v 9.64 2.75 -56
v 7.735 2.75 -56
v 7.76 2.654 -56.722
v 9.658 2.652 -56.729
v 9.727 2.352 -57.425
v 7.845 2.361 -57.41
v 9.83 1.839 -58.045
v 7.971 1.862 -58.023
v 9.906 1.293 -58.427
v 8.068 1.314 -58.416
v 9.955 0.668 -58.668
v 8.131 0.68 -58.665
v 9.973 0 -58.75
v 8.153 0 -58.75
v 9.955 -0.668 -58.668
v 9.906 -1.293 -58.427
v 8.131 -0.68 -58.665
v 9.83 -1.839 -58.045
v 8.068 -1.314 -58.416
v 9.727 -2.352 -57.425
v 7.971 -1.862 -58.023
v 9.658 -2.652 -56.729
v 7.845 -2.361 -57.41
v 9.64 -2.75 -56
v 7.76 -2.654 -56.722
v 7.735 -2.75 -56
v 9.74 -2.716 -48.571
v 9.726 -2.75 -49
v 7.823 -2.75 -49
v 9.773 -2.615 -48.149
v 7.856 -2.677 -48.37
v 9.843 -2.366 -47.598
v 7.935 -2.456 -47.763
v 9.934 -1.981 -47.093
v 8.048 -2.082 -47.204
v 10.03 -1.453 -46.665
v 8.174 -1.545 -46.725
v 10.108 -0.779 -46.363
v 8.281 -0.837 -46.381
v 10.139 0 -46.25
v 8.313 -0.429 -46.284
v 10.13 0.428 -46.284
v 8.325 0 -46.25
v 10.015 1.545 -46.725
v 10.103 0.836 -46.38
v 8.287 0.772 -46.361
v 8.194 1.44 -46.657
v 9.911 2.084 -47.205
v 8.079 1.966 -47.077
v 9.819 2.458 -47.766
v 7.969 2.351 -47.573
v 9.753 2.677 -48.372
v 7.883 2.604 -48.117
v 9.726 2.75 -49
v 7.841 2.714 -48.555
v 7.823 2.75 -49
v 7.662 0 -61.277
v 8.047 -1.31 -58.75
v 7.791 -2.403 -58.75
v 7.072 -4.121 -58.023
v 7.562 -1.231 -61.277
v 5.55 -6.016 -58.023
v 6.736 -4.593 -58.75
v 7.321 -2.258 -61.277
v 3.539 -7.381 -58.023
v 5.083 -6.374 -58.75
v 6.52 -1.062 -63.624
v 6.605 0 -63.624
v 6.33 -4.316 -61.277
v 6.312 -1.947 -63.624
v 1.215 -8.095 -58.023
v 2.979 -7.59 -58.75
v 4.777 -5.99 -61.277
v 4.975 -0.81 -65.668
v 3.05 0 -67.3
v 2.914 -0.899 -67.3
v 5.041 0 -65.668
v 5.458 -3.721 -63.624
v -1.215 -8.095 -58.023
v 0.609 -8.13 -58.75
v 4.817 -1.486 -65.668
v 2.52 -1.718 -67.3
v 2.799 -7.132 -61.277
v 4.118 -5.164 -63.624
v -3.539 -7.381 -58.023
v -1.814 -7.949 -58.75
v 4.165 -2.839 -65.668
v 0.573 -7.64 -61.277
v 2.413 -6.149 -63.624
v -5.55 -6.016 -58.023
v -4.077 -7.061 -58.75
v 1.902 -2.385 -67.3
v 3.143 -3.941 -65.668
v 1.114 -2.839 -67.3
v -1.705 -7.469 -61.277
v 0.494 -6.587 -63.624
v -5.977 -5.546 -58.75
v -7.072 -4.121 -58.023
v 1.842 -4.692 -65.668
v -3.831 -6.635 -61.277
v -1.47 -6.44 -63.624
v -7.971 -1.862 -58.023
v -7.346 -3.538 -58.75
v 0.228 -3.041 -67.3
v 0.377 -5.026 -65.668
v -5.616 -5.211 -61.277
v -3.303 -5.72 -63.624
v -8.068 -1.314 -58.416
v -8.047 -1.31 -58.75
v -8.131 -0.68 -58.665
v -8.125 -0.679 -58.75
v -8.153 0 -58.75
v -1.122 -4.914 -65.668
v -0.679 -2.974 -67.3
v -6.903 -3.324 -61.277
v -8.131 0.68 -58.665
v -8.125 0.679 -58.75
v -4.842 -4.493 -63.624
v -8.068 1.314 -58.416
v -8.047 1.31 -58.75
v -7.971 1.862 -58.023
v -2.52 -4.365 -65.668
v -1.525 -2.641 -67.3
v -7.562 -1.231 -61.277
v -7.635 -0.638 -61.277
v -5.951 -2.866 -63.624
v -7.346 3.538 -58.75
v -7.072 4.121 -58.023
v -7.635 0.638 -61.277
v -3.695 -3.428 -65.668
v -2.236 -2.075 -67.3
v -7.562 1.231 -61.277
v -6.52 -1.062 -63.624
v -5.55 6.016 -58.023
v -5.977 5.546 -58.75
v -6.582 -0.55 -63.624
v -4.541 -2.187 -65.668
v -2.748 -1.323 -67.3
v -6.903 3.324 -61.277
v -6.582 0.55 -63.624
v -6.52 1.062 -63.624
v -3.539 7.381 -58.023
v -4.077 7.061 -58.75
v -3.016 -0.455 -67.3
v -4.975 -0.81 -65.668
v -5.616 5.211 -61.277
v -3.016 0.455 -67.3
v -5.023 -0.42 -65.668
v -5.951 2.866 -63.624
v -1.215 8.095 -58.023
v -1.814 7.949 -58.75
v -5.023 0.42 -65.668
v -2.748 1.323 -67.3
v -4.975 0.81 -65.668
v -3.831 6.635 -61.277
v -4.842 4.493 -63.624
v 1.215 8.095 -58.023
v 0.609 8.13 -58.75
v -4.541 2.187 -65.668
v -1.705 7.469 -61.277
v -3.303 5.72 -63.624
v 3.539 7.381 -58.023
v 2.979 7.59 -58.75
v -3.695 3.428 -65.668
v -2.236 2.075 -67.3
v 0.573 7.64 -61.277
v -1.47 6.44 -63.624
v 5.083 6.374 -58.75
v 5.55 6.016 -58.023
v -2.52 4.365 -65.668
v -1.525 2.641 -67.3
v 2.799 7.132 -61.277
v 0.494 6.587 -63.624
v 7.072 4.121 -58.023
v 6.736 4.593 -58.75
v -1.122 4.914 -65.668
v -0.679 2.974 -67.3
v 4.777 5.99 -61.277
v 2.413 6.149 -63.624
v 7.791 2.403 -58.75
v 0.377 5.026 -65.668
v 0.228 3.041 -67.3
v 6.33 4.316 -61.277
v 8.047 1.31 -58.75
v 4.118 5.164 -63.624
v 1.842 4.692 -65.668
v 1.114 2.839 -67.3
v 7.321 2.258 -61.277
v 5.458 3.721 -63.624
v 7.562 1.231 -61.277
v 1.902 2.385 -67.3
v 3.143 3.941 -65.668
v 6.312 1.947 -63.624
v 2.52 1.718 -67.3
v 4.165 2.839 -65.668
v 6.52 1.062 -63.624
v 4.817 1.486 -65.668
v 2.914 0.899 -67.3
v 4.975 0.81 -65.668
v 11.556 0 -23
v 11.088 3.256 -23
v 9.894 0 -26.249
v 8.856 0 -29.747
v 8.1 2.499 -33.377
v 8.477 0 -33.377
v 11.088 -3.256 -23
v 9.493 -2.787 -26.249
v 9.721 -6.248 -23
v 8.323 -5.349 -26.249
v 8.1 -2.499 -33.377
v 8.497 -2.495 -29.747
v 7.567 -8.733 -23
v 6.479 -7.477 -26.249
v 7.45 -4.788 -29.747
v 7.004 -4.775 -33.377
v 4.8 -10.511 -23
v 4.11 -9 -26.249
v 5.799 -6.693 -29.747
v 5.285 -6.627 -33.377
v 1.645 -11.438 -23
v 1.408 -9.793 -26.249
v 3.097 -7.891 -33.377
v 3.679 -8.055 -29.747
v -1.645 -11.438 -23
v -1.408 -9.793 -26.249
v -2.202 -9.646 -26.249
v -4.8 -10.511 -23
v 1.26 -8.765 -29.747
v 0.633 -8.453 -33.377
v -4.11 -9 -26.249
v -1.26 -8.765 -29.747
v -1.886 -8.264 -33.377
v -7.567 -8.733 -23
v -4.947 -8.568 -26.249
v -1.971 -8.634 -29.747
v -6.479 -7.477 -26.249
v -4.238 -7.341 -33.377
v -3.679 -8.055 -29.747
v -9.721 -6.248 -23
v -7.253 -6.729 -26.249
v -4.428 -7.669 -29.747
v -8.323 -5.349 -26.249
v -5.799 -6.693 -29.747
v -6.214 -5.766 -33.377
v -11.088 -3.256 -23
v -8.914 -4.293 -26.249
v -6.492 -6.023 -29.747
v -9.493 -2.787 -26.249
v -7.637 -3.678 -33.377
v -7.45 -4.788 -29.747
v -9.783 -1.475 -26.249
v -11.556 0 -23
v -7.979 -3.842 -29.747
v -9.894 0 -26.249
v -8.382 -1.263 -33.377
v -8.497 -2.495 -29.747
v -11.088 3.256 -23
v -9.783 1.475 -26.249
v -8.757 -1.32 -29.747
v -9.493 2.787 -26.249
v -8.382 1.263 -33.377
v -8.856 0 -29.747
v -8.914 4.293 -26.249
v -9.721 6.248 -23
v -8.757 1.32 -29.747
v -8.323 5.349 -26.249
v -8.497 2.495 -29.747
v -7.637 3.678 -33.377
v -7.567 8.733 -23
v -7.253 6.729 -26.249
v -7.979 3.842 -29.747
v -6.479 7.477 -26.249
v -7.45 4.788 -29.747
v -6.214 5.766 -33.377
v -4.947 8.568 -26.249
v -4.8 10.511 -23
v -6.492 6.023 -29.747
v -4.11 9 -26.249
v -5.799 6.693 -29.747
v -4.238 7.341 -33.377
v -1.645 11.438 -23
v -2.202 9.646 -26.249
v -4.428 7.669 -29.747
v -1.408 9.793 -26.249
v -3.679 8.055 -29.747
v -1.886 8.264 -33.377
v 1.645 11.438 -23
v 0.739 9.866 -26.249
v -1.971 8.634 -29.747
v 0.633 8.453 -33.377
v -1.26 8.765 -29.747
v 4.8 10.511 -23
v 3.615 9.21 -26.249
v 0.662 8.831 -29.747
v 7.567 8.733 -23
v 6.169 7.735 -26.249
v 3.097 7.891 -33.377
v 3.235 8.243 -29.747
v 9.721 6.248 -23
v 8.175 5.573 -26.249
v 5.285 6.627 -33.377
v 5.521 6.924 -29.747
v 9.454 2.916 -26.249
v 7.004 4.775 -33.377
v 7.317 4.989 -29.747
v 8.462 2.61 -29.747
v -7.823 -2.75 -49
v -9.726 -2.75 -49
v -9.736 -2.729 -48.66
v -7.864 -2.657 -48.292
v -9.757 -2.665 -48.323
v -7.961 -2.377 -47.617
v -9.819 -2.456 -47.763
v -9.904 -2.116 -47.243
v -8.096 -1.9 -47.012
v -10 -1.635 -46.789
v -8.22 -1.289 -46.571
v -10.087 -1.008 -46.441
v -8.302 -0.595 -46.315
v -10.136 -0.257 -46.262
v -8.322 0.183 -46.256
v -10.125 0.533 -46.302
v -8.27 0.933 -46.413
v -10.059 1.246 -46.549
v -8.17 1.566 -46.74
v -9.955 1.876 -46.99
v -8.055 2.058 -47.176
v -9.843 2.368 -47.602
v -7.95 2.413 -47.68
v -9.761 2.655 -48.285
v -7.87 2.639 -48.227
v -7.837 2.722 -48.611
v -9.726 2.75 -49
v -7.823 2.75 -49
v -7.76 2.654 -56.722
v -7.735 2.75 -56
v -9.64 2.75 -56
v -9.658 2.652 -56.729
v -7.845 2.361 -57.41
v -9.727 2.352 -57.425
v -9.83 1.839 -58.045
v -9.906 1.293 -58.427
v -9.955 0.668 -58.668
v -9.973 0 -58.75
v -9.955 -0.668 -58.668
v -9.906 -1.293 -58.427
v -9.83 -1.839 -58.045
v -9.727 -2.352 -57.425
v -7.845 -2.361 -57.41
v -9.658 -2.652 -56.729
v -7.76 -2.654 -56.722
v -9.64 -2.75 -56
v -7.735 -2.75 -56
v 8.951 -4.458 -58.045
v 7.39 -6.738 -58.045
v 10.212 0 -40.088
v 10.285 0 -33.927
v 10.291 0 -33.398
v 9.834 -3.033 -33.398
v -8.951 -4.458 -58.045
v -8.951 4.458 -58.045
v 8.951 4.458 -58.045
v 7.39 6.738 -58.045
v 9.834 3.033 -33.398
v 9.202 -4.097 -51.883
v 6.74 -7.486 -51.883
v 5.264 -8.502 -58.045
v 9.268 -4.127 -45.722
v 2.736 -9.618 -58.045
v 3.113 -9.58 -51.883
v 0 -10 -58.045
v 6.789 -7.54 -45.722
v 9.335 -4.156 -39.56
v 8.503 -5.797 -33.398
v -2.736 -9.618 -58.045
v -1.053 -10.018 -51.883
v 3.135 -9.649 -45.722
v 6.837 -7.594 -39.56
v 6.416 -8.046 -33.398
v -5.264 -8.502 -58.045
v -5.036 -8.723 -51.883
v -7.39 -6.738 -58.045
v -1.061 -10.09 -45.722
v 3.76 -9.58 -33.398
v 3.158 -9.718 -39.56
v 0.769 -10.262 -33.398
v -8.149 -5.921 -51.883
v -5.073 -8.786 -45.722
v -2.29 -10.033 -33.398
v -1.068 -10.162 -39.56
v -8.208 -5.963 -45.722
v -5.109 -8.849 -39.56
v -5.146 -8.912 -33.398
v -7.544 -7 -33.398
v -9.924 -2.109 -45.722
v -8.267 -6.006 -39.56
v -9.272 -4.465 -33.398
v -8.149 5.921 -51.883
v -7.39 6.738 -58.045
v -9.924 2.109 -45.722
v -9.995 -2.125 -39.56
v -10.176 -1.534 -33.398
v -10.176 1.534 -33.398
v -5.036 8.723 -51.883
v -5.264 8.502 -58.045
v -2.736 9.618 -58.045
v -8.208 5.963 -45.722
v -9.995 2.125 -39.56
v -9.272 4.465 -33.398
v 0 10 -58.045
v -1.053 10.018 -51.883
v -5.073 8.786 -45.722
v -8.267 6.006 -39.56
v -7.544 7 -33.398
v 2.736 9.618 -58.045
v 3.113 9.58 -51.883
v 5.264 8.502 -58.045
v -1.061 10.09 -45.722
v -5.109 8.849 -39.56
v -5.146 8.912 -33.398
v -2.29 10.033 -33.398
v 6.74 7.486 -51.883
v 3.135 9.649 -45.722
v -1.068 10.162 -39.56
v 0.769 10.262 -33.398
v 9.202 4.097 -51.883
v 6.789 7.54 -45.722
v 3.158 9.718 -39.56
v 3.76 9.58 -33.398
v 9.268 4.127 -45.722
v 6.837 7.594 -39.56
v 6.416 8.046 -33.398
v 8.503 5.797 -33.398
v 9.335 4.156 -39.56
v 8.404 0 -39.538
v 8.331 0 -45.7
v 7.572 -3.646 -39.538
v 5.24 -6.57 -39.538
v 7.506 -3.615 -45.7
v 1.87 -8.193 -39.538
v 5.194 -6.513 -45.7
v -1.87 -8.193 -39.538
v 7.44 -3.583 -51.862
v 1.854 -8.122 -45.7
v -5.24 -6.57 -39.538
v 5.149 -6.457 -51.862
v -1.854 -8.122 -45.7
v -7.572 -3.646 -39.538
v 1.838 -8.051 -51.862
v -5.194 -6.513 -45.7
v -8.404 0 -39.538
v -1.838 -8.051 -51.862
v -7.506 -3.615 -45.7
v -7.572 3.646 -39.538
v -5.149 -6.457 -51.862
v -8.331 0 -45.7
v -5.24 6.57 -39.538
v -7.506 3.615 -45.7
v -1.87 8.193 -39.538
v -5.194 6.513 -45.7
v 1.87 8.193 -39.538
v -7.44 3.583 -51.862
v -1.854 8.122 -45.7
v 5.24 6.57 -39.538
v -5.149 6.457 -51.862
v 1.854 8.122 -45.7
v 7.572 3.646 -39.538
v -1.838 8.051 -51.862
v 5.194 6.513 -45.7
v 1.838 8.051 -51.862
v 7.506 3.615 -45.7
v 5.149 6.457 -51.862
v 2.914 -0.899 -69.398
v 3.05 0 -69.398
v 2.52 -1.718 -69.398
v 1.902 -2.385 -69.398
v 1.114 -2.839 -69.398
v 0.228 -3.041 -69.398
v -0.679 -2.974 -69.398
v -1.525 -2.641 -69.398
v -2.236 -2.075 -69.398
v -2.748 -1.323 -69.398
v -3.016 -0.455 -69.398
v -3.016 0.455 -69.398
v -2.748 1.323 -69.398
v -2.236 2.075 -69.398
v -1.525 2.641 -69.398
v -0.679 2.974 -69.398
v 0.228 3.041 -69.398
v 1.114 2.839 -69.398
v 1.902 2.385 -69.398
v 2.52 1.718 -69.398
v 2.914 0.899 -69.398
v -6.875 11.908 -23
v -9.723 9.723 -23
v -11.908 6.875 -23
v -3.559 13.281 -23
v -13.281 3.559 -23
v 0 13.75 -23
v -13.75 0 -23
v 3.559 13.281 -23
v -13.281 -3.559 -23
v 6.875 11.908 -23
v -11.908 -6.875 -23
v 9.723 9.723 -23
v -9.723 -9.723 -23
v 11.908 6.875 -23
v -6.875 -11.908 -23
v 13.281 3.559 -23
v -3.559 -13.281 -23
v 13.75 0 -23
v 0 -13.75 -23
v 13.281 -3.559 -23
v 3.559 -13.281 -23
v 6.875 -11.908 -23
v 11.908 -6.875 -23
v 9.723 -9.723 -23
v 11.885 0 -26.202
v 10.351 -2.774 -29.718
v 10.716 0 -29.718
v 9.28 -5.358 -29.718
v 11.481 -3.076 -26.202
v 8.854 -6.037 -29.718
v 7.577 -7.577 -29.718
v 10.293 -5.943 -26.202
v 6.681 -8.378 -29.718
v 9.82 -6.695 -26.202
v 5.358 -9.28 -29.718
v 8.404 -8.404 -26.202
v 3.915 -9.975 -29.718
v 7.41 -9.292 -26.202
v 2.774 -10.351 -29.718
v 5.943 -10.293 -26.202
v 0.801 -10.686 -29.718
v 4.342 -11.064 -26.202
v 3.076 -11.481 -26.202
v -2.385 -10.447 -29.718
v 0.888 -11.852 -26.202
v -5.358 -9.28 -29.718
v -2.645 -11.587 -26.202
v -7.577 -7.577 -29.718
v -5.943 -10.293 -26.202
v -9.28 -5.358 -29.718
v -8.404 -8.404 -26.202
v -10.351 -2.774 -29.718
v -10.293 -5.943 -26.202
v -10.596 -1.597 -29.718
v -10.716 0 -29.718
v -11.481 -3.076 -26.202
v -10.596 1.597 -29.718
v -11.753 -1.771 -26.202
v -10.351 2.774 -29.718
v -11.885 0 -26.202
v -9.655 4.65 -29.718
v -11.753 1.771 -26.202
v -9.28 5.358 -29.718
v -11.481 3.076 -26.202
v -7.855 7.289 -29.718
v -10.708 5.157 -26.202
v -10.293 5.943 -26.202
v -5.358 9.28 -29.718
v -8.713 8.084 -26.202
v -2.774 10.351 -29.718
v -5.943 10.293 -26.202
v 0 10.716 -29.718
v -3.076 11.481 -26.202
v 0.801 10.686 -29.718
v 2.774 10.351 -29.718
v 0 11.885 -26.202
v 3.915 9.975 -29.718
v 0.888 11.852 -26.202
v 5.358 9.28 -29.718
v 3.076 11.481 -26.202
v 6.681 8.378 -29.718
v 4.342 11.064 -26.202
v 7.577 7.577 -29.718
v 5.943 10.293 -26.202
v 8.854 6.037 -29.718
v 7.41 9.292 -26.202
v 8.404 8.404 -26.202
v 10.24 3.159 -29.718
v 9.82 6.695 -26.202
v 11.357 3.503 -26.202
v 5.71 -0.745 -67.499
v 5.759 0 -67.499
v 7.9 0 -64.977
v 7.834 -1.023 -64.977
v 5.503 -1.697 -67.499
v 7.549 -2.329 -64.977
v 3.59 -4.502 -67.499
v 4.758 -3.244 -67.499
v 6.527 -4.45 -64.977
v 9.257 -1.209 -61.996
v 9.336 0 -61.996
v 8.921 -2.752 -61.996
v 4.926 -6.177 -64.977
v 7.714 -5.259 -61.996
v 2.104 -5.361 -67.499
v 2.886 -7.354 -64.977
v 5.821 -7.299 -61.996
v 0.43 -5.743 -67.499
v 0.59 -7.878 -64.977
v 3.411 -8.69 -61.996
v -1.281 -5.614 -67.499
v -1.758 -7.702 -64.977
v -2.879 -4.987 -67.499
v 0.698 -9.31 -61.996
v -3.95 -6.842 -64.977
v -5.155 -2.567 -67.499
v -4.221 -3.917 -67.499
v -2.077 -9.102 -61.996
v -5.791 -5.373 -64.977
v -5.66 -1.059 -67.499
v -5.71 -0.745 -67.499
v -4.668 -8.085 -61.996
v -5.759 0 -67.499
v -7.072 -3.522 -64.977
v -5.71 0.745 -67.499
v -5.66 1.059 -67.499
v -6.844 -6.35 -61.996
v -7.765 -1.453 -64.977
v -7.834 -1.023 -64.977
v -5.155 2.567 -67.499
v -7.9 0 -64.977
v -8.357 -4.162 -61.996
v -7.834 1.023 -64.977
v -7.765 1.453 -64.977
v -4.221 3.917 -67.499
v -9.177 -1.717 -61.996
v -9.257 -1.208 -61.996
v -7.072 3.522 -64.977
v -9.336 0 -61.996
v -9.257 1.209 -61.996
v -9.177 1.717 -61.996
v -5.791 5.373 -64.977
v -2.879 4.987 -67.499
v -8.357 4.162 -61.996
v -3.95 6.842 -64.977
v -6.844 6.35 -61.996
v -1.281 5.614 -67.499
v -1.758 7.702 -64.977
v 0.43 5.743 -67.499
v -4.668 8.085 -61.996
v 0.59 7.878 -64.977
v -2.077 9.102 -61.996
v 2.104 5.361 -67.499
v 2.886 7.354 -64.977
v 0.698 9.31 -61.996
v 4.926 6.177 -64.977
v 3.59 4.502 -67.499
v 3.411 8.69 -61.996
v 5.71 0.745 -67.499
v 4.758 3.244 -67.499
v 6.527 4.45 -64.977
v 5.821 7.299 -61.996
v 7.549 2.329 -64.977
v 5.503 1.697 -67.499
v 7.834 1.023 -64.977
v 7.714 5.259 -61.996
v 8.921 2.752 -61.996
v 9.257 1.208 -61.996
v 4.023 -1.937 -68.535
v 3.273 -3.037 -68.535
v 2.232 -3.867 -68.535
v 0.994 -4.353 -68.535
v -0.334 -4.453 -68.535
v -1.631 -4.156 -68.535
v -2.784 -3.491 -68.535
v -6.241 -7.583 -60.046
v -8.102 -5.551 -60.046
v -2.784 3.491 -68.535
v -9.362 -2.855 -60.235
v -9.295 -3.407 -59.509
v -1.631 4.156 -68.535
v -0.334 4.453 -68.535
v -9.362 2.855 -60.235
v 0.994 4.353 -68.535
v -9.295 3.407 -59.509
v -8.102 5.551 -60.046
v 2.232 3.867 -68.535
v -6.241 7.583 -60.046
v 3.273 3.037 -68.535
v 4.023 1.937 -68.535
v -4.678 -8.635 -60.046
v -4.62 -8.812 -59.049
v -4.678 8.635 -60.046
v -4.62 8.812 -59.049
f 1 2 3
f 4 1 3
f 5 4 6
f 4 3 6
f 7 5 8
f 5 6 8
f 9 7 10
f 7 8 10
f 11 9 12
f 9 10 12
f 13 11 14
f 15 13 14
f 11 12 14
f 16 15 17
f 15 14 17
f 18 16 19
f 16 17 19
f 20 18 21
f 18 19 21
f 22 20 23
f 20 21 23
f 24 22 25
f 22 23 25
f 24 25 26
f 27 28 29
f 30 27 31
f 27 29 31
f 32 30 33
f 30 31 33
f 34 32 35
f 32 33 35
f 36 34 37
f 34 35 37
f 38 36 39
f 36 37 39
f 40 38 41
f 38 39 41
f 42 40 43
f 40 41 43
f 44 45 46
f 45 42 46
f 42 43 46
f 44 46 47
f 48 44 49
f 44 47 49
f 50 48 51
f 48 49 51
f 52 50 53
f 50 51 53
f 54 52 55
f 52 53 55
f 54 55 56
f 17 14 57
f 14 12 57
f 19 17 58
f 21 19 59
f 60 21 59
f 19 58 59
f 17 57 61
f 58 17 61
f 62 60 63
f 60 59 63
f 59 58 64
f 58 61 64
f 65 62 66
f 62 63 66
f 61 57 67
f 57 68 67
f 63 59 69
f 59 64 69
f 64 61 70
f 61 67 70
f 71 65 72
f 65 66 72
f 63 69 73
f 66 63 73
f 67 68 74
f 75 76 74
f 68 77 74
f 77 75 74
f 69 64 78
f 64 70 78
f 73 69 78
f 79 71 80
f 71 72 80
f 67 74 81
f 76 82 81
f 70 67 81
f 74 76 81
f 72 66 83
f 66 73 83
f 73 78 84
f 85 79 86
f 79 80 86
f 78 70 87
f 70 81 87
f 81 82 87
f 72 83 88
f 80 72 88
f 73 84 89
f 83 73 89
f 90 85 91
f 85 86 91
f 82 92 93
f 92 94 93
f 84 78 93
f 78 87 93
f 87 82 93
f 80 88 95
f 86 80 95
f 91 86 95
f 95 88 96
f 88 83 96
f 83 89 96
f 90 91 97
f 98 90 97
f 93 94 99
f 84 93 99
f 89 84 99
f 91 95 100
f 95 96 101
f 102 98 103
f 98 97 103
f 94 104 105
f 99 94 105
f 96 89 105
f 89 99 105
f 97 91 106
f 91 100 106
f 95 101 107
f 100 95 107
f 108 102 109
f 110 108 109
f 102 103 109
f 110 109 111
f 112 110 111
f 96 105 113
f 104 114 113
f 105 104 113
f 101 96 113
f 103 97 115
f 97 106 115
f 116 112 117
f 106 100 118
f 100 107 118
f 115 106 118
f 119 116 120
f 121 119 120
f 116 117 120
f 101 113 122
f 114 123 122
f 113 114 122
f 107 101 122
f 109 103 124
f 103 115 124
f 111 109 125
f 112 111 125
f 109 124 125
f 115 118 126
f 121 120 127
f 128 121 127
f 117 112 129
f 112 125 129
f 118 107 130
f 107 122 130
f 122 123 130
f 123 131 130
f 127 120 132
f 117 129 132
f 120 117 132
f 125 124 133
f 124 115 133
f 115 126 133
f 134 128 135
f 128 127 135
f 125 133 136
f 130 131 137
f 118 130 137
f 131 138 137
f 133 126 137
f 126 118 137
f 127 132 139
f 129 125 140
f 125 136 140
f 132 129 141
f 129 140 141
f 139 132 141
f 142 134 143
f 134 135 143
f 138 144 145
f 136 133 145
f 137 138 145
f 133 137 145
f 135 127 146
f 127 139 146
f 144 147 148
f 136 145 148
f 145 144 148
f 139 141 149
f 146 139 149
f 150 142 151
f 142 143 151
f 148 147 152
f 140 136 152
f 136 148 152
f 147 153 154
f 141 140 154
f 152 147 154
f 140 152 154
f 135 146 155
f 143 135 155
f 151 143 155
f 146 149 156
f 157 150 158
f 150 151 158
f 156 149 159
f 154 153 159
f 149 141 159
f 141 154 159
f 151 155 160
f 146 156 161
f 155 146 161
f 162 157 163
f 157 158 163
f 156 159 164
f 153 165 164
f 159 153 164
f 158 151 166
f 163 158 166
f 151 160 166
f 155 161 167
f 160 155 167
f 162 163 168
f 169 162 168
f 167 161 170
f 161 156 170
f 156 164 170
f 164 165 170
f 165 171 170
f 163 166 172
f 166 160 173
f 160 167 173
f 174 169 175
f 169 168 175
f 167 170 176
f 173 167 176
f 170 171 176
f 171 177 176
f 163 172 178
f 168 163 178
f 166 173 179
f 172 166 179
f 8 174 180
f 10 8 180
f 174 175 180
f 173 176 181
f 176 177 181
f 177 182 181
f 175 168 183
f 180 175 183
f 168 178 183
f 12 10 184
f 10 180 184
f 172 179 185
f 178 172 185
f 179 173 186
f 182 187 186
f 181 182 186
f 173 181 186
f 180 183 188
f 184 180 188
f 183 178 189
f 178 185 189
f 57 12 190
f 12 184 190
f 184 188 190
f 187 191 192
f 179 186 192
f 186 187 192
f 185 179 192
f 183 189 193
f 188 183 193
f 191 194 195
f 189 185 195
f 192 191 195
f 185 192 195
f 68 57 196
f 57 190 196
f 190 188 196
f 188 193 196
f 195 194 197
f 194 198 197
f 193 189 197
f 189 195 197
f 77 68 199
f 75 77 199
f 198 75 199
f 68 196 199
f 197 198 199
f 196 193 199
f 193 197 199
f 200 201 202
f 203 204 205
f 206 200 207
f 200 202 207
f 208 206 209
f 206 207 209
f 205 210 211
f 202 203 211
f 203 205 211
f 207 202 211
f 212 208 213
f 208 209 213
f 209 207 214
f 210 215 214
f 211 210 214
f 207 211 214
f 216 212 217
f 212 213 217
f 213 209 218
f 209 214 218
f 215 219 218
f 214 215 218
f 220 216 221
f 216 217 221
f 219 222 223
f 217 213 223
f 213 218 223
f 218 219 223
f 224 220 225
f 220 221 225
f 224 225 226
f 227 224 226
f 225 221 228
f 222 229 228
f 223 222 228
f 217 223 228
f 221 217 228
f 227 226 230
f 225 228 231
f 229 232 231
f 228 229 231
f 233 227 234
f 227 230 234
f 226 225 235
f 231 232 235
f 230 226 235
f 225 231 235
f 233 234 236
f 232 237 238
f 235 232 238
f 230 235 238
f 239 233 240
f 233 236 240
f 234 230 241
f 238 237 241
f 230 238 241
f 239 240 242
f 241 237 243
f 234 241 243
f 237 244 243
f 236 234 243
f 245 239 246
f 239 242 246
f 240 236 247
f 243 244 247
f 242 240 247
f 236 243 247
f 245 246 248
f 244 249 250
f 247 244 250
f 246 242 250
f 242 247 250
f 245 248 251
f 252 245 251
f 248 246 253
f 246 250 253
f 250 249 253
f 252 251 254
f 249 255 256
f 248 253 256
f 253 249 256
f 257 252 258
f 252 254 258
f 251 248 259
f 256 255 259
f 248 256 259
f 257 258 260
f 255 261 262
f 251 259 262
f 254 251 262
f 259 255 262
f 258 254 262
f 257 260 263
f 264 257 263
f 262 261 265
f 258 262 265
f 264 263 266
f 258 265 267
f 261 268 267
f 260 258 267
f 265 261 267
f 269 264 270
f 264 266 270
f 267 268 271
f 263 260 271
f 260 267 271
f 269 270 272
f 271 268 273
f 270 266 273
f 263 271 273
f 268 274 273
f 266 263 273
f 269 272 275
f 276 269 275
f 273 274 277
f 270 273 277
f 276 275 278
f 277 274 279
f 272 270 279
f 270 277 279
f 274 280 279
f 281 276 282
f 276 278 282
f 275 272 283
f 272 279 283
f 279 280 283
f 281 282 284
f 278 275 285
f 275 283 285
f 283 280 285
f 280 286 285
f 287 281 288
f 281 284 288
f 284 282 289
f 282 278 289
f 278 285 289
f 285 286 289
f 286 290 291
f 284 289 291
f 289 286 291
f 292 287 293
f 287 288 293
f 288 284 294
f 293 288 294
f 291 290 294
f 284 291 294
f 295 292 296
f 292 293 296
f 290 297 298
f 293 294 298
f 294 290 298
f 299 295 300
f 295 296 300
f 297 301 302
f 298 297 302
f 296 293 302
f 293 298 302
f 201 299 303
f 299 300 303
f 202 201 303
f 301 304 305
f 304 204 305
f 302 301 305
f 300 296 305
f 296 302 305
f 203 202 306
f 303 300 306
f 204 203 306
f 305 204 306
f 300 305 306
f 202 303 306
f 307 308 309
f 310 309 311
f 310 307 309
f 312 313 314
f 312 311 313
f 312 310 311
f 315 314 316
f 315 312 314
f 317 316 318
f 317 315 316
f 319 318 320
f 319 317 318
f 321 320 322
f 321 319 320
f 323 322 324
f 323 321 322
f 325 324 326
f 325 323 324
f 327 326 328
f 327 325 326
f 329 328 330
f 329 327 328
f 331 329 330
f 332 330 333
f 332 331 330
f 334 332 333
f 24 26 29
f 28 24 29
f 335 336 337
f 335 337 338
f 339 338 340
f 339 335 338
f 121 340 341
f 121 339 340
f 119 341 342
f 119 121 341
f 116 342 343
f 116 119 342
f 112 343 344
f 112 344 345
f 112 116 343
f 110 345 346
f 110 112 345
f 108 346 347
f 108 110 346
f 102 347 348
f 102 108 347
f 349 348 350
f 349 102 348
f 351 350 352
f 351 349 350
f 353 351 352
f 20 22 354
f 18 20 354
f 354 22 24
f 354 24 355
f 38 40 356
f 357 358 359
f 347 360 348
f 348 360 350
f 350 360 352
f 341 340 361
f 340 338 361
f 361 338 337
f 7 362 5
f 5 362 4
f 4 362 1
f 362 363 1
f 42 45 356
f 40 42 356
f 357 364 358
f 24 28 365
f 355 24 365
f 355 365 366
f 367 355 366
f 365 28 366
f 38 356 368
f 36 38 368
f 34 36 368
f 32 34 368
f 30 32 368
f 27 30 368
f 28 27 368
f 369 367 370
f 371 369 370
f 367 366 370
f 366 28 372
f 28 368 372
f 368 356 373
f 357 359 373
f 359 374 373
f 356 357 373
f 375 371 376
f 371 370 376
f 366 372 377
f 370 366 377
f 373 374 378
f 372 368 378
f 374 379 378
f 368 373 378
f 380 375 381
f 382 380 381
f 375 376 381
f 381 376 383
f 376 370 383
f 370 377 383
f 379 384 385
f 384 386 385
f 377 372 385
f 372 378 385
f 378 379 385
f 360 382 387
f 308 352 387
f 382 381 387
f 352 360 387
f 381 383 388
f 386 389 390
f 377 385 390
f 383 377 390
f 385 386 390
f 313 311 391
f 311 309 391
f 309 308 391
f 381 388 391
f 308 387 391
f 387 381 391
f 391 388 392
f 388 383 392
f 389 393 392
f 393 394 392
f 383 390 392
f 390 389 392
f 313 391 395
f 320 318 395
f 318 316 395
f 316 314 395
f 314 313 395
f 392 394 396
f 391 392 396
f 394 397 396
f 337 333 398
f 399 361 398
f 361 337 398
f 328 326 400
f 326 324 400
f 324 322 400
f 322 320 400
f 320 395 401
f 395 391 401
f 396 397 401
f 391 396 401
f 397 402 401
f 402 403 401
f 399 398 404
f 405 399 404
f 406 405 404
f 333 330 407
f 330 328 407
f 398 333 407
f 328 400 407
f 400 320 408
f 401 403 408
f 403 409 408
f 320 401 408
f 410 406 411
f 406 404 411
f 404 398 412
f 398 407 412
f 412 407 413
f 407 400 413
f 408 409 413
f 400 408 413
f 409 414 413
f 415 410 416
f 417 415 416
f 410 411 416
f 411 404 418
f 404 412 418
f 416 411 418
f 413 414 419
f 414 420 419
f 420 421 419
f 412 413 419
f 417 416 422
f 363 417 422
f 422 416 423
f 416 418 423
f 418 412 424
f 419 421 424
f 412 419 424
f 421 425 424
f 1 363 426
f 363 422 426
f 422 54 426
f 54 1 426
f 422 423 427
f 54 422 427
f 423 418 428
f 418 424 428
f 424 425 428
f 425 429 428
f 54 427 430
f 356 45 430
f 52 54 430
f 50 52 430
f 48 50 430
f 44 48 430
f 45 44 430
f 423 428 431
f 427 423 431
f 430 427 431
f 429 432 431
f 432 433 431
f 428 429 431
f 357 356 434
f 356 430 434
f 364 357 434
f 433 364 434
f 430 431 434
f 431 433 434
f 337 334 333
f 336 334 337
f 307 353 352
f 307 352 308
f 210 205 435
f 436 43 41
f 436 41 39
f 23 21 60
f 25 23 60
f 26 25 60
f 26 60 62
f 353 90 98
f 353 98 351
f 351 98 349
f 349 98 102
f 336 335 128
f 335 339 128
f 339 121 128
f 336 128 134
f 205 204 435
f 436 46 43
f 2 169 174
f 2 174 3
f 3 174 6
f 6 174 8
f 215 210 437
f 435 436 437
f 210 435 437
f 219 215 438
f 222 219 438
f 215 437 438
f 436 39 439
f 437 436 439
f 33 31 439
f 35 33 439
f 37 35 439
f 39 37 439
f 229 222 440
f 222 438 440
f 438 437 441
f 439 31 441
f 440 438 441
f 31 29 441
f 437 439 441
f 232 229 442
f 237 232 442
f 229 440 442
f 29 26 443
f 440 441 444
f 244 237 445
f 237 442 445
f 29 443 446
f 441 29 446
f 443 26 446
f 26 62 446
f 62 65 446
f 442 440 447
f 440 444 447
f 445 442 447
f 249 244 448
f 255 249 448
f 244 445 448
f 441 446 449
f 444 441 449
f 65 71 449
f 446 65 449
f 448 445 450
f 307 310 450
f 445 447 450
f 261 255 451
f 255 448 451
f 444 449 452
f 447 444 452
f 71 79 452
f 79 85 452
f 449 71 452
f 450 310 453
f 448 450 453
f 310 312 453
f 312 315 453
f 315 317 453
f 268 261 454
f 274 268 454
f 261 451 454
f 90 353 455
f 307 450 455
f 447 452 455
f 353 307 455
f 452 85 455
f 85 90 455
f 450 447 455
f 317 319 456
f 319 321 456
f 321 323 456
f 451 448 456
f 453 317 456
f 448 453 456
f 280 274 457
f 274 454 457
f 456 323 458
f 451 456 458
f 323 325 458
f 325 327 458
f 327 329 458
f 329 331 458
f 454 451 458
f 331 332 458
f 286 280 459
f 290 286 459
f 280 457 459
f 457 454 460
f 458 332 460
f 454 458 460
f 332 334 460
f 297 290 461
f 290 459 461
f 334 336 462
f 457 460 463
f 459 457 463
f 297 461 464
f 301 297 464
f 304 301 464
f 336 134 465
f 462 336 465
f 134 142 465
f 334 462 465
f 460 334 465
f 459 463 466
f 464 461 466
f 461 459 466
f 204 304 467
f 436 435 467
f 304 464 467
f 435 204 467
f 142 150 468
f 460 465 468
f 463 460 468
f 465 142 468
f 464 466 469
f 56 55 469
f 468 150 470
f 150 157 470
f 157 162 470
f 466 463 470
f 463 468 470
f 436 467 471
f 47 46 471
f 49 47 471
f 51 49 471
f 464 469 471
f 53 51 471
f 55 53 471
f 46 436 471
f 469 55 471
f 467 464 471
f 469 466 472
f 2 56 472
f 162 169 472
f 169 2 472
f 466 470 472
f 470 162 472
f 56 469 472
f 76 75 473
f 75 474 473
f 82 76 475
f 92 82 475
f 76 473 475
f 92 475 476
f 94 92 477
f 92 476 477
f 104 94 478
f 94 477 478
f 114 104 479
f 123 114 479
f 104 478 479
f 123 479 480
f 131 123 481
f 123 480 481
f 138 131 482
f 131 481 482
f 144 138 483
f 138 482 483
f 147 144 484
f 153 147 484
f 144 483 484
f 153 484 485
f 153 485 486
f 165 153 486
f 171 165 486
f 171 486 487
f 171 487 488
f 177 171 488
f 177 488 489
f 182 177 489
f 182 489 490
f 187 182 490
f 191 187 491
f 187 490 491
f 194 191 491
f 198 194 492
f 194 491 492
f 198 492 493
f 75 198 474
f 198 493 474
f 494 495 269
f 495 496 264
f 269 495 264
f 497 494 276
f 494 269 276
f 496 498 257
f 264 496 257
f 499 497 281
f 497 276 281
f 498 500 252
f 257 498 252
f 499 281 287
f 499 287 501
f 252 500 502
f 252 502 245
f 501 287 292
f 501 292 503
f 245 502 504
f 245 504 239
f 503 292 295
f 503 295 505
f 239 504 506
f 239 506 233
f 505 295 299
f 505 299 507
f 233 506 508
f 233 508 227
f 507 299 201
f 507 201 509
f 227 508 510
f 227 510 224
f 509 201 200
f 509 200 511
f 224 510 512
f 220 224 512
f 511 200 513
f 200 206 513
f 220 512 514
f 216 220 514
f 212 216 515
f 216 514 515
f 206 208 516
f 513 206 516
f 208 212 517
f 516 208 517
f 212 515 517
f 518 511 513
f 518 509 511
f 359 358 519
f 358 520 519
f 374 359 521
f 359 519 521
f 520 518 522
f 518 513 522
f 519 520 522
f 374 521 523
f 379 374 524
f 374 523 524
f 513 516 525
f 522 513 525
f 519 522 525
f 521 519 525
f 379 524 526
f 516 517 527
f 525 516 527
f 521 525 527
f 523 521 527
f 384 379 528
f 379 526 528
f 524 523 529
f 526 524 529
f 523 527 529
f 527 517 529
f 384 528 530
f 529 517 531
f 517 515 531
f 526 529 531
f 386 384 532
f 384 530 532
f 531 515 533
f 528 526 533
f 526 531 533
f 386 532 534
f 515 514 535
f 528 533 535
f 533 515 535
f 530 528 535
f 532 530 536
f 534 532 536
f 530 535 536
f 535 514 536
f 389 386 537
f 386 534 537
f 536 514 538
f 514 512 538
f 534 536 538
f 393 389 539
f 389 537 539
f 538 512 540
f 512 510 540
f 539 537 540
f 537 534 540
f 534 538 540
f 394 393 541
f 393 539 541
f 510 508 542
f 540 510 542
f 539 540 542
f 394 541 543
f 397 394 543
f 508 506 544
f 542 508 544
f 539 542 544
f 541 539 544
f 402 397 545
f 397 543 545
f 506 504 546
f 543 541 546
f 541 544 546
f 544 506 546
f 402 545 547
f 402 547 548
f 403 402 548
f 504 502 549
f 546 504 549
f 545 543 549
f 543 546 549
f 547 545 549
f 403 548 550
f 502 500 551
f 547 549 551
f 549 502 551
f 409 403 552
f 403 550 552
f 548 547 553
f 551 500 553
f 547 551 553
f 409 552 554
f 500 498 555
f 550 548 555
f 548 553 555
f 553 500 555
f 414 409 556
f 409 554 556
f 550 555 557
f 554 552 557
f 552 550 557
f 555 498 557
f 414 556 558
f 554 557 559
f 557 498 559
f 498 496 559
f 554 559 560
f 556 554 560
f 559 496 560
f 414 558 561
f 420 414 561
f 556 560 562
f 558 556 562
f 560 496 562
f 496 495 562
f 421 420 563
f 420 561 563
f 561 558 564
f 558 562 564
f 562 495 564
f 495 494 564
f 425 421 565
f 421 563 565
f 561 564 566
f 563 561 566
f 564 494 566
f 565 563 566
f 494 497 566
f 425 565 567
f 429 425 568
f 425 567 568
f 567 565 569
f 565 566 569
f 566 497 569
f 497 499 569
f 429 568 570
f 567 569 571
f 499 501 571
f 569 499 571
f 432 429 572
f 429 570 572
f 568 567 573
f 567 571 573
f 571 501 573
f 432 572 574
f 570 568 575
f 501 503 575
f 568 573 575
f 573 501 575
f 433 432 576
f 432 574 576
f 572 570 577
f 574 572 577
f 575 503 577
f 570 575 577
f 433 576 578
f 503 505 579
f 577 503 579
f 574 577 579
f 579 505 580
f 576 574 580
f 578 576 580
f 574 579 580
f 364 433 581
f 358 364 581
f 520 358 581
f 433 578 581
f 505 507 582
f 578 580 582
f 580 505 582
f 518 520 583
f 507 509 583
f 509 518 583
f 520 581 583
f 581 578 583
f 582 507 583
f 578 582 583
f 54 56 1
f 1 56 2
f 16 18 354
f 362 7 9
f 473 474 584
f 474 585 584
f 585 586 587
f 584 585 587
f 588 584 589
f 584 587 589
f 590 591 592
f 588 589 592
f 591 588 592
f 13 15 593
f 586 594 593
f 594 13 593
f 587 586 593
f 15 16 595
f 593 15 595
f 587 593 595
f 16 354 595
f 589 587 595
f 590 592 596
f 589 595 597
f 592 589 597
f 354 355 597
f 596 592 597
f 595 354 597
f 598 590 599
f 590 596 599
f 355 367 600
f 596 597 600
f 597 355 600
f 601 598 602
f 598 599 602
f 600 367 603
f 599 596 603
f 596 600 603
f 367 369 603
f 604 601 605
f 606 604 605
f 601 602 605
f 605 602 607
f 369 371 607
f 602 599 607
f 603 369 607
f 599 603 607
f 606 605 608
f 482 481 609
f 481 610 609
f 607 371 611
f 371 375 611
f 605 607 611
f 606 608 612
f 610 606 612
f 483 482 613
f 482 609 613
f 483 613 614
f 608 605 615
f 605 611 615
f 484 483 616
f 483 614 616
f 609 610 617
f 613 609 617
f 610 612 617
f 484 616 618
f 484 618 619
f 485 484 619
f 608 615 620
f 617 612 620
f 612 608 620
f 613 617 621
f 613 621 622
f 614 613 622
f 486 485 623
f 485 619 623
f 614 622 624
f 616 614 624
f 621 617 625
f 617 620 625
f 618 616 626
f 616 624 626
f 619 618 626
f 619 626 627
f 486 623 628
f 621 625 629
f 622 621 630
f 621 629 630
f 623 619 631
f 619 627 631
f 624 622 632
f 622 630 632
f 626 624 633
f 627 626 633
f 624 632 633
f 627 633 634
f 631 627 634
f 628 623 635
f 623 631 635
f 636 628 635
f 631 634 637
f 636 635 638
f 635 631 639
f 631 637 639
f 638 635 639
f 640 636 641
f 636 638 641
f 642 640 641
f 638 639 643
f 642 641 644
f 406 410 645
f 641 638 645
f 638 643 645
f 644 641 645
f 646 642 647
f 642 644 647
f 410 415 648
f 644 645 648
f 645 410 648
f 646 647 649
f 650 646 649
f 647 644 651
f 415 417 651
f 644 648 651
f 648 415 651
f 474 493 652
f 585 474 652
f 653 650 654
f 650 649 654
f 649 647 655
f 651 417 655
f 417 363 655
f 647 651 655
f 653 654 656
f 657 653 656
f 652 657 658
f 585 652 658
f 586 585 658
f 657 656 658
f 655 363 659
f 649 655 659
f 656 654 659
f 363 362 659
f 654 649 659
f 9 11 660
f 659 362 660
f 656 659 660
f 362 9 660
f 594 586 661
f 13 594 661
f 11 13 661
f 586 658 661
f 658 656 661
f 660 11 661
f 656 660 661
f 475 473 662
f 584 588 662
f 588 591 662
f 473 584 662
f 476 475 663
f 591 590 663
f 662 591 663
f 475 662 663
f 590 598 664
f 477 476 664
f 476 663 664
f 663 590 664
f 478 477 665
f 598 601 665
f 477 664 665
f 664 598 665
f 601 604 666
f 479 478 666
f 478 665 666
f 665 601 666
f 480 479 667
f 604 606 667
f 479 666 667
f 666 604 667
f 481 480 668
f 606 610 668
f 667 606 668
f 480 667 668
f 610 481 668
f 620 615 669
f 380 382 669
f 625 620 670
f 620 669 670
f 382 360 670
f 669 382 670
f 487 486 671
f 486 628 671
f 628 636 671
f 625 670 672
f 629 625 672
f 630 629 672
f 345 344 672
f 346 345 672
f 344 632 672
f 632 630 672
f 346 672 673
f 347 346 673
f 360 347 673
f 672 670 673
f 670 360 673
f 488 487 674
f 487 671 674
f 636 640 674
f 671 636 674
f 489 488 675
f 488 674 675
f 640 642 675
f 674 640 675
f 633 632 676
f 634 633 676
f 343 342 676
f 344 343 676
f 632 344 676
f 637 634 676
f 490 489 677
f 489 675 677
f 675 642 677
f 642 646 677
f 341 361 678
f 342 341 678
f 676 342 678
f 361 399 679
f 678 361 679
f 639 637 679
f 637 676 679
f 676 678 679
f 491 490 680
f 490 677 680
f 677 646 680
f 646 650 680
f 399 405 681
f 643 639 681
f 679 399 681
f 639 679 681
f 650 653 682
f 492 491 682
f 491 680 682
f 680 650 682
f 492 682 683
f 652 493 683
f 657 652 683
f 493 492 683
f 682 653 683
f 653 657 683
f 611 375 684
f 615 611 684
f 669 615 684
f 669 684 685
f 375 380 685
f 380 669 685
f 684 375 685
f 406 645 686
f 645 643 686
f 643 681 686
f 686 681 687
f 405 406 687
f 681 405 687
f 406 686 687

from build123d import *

# Parameters (mm, degrees)
SIDECONNECTIONCUTOUT_DEPTH      = 73.071040696
SIDECONNECTIONCUTOUT_DEPTH_BACK = 73.071040696


with BuildPart() as part:
    # ProfileS → Profile (revolve)
    with BuildSketch(Plane(origin=(0, 0, 0), x_dir=(1, 0, 0), z_dir=(0, 1, 0))):
        with BuildLine():
            Line((10, 58.044891829), (10.291196376, 33.398198054))
            ThreePointArc((10.291196376, 33.398198054), (11.210065487, 27.929487559), (13.75, 23))
            Line((13.75, 23), (11.555755546, 23))
            ThreePointArc((11.555755546, 23), (9.29389864, 27.974053085), (8.476604376, 33.376758967))
            Line((8.476604376, 33.376758967), (8.185408, 58.023452742))
            ThreePointArc((8.185408, 58.023452742), (6.786696454, 63.308767571), (3.05, 67.299763243))
            Line((3.05, 67.299763243), (3.05, 69.398198054))
            ThreePointArc((3.05, 69.398198054), (8.088410722, 64.678596949), (10, 58.044891829))
        make_face()
    revolve(axis=Axis((0, 0, -23), (0, 0, -1)))

    # SideConnectionCutoutS → SideConnectionCutout (cut, two sides: drawn at the far end of the back side and taken through both)
    with BuildSketch(Plane(origin=(0, 0, 0), x_dir=(0, 0, -1), z_dir=(1, 0, 0)).offset(-SIDECONNECTIONCUTOUT_DEPTH_BACK)):
        with BuildLine():
            Line((56, -2.75), (49, -2.75))
            ThreePointArc((49, -2.75), (46.25, 0), (49, 2.75))
            Line((49, 2.75), (56, 2.75))
            ThreePointArc((56, 2.75), (58.75, 0), (56, -2.75))
        make_face()
    extrude(amount=SIDECONNECTIONCUTOUT_DEPTH + SIDECONNECTIONCUTOUT_DEPTH_BACK, mode=Mode.SUBTRACT)


solid = part.part
